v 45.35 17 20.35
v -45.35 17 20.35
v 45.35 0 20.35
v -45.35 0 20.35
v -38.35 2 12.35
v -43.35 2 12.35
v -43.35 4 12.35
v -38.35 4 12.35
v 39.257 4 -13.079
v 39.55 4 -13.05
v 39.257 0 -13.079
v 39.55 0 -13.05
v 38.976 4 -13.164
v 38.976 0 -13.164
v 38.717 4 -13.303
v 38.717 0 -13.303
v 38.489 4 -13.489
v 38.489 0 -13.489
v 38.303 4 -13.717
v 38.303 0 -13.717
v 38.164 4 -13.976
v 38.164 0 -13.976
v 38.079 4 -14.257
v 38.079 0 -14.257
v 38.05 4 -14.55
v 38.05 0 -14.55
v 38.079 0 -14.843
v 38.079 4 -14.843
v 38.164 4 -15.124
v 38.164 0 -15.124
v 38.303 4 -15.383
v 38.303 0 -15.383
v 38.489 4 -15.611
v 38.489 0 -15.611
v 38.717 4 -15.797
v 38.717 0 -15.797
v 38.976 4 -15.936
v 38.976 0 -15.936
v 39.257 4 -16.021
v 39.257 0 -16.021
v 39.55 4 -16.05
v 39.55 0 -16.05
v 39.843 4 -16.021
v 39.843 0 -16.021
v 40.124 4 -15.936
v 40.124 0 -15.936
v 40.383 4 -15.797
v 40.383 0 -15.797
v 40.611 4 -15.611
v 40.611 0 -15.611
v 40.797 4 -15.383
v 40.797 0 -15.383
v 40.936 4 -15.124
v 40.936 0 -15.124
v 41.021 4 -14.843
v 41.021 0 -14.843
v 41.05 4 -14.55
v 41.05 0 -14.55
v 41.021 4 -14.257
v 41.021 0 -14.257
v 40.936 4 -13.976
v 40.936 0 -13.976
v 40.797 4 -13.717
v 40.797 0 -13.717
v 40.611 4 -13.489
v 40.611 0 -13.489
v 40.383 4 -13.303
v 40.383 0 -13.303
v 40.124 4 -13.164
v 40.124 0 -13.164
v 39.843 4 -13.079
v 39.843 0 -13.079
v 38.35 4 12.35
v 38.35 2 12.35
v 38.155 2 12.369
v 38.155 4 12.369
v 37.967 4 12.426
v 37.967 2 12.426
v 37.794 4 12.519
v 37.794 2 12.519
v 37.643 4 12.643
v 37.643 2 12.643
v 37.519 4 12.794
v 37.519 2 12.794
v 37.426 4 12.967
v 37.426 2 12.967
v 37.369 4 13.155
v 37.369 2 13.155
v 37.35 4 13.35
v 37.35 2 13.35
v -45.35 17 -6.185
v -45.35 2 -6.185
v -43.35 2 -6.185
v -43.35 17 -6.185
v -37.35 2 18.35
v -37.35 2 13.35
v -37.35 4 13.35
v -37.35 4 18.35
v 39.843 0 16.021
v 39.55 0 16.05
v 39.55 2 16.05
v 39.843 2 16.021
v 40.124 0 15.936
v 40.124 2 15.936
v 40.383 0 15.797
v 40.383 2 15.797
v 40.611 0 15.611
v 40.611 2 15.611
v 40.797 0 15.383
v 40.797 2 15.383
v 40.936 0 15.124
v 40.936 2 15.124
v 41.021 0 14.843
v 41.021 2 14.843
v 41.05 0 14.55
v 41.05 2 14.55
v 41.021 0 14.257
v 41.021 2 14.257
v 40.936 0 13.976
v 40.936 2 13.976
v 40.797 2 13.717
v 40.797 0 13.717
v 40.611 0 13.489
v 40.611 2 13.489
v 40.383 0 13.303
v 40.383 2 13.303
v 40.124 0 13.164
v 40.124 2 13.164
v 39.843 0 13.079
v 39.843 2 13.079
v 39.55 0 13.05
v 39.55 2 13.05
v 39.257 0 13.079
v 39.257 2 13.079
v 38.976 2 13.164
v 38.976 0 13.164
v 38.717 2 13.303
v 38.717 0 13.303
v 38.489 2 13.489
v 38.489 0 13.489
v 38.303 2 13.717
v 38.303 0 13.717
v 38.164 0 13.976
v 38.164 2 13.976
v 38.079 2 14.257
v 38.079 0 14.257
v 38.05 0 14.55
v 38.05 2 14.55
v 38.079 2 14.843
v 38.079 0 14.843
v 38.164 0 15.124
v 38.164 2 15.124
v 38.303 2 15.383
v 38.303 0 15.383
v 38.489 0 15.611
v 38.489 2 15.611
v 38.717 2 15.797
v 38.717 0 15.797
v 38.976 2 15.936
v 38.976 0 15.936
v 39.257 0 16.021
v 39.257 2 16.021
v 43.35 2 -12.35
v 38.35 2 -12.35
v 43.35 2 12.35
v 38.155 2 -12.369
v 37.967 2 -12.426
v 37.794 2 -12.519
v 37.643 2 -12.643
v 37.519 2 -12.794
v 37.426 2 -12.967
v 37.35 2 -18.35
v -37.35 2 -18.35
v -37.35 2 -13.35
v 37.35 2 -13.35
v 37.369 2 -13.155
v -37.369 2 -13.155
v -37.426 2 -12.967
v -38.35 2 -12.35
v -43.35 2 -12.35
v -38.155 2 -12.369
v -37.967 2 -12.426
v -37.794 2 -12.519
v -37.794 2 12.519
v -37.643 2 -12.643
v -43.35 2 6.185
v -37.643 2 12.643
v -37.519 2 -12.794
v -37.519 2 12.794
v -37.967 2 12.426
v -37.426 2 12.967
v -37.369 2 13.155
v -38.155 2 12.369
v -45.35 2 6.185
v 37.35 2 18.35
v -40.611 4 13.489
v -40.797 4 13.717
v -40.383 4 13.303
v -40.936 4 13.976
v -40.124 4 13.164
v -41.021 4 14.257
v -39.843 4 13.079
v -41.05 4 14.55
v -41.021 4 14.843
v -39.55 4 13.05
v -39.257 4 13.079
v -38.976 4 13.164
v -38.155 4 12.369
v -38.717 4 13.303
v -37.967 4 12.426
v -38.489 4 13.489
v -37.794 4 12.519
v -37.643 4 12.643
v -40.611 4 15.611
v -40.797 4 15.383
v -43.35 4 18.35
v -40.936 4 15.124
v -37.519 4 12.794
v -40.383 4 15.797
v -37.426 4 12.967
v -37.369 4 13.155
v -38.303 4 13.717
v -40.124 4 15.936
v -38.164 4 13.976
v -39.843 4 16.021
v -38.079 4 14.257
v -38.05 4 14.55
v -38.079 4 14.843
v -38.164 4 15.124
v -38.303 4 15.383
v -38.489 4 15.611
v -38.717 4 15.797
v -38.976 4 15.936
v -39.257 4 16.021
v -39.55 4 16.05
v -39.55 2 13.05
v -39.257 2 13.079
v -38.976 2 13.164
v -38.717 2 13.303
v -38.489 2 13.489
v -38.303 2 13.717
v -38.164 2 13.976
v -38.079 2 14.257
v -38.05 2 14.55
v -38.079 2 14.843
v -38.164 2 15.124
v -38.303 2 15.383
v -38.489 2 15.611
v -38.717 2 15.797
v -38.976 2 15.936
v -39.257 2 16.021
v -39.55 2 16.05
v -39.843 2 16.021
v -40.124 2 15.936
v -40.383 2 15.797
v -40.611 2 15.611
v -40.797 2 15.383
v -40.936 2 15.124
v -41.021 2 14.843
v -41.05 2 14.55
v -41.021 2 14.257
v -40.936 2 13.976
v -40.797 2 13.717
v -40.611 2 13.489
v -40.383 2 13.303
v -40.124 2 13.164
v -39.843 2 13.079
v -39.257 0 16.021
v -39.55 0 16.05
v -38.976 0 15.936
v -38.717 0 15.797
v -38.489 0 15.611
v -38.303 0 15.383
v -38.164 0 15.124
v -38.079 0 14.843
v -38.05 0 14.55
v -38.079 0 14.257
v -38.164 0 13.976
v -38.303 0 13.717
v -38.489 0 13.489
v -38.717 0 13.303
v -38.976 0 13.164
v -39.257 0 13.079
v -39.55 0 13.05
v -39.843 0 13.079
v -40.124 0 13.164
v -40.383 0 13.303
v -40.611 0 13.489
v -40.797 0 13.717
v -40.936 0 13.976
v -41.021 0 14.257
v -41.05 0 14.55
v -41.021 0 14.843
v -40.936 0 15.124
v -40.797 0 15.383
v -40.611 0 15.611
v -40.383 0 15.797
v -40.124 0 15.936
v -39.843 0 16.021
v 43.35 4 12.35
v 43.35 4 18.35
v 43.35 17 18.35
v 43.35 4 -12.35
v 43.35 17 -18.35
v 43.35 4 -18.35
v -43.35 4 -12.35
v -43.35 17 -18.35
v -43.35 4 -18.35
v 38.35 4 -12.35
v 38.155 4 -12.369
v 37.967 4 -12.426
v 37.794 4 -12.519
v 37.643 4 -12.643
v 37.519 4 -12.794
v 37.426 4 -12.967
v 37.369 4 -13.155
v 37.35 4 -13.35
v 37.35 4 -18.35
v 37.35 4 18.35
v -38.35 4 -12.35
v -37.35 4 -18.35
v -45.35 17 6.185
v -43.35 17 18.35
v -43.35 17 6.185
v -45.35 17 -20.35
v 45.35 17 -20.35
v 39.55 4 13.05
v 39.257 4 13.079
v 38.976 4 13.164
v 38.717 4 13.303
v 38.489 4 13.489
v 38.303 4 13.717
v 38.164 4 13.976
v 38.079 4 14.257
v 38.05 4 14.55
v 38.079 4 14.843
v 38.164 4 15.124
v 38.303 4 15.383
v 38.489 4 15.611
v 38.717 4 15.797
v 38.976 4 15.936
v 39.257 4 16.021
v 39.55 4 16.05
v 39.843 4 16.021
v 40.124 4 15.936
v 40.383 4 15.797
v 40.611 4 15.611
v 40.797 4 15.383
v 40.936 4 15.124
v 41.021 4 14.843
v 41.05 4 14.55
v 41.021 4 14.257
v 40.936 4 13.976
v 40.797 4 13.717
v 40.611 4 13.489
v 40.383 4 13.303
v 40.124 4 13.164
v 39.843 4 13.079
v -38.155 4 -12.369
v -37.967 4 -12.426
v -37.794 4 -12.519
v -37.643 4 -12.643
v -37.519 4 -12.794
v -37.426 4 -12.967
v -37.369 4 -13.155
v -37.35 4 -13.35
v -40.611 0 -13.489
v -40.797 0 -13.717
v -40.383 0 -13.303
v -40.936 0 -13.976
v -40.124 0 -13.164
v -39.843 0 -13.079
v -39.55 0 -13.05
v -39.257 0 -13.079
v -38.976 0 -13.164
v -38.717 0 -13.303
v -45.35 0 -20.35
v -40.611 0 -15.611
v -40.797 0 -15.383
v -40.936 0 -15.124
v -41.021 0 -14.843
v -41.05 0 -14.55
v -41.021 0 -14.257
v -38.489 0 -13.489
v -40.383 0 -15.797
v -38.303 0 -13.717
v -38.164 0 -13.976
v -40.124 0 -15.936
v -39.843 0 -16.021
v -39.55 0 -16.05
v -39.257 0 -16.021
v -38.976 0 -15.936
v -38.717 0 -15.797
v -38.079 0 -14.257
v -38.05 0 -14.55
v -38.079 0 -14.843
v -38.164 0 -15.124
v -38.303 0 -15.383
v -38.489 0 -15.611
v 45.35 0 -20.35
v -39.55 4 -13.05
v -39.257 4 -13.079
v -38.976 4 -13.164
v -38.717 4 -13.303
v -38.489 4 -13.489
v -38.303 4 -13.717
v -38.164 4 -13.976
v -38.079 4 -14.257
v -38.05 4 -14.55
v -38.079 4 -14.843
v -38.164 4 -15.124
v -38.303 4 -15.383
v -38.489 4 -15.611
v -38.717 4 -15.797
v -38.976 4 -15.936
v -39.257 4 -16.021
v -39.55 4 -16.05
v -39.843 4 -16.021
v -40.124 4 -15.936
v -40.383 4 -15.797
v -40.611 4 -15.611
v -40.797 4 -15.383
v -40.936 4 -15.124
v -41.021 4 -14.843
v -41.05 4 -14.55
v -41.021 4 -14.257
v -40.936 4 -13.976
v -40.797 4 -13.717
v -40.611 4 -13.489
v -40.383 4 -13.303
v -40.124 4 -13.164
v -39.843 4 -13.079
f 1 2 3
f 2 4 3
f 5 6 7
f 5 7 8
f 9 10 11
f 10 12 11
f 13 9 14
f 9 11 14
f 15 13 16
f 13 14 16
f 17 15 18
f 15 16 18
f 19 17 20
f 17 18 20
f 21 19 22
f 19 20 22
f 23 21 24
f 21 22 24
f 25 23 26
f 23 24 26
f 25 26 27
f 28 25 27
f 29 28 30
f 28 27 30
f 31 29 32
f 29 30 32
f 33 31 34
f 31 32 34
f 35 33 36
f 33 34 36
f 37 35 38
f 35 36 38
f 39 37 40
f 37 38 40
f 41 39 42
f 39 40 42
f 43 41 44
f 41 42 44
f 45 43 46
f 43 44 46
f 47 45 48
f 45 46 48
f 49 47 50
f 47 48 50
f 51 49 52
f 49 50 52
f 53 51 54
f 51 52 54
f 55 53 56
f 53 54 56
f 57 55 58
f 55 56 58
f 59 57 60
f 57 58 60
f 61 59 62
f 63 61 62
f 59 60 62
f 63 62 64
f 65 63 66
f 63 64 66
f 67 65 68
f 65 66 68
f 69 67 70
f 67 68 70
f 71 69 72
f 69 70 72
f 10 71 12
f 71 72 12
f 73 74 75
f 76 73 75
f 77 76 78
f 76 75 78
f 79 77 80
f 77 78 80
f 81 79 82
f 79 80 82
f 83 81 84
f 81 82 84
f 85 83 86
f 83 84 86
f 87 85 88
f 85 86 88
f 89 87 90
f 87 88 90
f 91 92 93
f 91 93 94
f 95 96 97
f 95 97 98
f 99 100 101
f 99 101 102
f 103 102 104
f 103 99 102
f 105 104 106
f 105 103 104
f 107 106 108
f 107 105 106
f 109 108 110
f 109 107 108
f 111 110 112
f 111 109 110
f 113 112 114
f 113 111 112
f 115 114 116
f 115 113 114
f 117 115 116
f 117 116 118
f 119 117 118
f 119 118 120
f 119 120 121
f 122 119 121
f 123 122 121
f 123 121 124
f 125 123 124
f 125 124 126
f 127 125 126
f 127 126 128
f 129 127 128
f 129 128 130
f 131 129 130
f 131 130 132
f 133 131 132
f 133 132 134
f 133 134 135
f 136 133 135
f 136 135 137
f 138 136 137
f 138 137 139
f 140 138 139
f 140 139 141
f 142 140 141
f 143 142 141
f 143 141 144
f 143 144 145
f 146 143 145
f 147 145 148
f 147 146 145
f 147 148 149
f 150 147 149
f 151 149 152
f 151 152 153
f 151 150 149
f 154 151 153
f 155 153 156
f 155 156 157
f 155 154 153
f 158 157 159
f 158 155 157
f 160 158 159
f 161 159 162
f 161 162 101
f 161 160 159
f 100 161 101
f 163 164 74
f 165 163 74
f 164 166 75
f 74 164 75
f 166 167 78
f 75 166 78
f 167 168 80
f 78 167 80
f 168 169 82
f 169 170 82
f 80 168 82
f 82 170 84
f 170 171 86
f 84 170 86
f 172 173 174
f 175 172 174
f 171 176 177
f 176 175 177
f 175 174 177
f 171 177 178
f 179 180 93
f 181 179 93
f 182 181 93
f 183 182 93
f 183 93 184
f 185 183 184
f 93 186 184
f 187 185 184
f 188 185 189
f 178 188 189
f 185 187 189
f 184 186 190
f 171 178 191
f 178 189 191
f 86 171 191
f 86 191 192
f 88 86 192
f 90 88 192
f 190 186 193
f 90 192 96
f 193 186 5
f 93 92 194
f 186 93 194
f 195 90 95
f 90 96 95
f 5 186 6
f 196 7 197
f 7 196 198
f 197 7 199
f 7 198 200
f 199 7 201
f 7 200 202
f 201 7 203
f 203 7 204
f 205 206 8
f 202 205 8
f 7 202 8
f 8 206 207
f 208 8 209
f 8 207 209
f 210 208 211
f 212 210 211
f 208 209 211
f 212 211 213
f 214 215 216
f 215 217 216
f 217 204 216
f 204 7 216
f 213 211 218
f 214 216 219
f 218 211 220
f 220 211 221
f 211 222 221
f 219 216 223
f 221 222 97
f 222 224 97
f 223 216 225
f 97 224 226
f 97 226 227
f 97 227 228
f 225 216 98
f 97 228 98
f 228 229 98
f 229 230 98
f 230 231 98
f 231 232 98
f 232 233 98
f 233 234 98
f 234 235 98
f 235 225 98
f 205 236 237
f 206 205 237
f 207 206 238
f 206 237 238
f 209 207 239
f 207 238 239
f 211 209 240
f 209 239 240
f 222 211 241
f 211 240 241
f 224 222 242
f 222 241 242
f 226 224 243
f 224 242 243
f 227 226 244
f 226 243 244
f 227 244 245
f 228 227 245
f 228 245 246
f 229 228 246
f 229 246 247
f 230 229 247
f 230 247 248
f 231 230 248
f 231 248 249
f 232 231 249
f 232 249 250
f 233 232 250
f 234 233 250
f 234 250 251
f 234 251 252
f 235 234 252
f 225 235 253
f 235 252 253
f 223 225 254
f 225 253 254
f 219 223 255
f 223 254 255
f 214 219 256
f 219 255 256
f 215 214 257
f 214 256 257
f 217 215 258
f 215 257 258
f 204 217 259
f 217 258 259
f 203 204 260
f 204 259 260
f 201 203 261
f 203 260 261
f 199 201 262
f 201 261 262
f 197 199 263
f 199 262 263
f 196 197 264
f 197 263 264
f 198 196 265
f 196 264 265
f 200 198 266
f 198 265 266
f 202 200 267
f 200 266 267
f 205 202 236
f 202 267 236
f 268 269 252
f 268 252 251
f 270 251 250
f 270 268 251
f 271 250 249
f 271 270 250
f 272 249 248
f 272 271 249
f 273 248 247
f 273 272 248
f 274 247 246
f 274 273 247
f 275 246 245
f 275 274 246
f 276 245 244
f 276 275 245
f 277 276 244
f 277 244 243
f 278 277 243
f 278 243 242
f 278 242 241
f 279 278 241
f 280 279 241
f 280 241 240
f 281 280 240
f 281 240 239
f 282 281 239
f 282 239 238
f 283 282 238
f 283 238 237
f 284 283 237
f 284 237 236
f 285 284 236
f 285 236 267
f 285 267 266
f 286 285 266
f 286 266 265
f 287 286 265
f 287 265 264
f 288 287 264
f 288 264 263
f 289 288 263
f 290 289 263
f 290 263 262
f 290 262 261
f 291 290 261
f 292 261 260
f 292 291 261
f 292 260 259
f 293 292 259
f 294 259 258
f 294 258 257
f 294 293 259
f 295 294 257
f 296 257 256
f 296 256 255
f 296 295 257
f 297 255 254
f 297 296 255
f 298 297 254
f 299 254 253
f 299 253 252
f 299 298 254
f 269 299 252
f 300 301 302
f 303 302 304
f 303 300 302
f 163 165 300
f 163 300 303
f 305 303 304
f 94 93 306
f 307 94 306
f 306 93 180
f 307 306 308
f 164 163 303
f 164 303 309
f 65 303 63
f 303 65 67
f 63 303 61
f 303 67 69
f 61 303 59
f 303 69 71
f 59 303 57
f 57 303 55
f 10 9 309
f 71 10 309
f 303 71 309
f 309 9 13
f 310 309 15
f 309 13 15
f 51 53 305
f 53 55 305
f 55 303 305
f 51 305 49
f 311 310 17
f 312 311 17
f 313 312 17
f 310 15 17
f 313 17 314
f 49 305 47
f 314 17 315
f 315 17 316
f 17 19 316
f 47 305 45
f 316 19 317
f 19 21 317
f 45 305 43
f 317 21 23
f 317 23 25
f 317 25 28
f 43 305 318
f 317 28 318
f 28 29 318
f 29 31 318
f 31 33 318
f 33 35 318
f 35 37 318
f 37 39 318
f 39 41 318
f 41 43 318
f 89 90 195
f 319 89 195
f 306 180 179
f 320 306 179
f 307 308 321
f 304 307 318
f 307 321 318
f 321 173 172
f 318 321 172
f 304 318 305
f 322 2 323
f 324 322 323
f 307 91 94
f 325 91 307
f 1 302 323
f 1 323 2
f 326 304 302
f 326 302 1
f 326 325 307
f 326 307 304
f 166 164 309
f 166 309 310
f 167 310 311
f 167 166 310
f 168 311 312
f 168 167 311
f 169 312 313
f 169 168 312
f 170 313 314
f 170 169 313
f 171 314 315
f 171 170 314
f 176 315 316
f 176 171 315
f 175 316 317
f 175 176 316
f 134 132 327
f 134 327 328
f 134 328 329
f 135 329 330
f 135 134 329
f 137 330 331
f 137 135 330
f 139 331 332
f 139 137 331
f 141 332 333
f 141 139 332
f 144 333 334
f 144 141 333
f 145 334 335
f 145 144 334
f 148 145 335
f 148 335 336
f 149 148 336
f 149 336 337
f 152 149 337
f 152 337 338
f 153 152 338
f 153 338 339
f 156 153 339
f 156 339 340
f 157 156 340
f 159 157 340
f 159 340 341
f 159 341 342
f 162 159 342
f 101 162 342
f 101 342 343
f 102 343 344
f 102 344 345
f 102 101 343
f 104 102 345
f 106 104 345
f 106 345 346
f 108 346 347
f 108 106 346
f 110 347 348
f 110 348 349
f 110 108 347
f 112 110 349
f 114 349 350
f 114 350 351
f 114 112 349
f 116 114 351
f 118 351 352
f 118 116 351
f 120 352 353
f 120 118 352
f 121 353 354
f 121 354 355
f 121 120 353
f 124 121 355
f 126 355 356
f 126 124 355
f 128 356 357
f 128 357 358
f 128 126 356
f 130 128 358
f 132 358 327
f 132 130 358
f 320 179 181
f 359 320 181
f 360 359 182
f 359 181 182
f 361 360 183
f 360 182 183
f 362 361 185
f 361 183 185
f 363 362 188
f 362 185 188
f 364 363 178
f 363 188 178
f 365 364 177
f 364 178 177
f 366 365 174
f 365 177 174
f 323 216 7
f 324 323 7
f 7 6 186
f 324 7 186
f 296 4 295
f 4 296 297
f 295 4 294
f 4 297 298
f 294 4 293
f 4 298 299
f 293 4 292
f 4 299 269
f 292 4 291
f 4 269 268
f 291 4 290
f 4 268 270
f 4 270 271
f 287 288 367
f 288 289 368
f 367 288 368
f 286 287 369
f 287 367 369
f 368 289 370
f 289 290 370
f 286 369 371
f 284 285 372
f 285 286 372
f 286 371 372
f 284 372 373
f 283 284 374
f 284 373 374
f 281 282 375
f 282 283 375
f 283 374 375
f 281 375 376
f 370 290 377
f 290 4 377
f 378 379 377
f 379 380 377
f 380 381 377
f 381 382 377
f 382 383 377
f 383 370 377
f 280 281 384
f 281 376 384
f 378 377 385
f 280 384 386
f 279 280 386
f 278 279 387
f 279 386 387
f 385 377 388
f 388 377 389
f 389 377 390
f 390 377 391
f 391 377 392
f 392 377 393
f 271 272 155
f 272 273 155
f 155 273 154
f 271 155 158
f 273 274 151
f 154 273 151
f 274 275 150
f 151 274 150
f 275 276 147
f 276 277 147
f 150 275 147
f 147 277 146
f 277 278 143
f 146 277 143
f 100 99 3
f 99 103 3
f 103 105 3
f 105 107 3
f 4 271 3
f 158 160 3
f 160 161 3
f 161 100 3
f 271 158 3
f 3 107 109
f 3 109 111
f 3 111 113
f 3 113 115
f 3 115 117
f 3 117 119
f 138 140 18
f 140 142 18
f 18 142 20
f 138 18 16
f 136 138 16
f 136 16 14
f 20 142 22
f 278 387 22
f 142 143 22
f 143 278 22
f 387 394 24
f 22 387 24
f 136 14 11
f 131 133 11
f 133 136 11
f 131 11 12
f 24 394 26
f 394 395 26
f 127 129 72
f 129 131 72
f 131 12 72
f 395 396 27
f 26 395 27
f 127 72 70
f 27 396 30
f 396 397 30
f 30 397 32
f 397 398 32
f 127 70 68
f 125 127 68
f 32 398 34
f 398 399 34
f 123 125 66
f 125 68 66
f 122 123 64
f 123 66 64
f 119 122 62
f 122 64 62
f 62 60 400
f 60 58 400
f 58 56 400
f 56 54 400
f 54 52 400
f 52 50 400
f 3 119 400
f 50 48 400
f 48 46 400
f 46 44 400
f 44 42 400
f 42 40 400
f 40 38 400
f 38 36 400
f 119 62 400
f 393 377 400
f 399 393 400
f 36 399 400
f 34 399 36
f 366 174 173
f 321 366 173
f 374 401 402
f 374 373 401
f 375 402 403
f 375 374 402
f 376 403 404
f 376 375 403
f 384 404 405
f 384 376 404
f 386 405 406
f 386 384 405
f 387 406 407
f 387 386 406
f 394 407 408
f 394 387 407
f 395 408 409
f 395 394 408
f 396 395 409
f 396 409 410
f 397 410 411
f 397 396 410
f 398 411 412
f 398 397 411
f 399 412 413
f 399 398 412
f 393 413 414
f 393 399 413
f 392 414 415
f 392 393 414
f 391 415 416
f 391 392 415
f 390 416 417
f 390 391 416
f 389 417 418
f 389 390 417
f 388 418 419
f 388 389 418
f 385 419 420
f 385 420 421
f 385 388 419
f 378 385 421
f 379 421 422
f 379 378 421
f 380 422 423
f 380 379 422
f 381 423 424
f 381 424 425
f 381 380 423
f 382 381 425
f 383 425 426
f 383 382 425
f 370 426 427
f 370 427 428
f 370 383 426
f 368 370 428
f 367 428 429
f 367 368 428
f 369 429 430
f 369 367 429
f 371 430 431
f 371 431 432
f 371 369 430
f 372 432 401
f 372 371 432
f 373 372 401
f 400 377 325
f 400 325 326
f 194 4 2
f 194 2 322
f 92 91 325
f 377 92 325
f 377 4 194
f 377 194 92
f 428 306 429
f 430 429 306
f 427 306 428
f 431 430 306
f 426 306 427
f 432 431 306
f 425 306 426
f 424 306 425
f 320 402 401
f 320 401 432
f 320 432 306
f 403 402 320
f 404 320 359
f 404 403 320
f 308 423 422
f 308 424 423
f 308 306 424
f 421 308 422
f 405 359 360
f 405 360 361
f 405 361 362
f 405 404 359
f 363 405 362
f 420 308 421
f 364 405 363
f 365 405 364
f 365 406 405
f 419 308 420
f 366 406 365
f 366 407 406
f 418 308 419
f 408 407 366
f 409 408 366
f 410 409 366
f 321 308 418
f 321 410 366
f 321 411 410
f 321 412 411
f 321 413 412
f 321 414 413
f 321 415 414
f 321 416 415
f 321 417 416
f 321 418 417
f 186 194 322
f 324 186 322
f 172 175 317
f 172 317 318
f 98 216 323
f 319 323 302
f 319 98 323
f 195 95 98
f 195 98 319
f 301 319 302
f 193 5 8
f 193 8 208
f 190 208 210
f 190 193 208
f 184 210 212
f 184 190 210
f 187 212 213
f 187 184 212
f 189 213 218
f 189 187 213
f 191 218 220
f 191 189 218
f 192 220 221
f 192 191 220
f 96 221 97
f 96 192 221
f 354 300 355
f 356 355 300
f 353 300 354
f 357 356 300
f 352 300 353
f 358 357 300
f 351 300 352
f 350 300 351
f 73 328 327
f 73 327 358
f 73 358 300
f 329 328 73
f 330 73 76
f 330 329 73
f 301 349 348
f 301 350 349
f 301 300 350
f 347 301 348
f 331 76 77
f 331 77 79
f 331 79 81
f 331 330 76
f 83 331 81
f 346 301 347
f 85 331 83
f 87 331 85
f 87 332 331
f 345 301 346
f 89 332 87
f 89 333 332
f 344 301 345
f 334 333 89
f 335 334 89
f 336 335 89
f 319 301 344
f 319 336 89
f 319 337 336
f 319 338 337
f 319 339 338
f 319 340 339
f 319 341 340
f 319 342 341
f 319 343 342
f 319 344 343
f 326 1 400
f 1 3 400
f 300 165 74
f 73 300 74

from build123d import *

# Parameters (mm, degrees)
SKETCH1_W               = 90.7
SKETCH1_H               = 40.7
SKETCH1_R               = 1.5
BOSS_EXTRUDE3_DEPTH     = 2
SKETCH2_W               = 90.7
SKETCH2_H               = 40.7
SKETCH2_W_2             = 86.7
SKETCH2_H_2             = 36.7
BOSS_EXTRUDE4_DEPTH     = 15
CUT_EXTRUDE1_REACH      = 96.497
CUTOUT_W                = 12.369316876
CUTOUT_H                = 15
SKETCH3_R               = 1.5
BOSS_EXTRUDE5_DEPTH     = 2
MIRROR2_COPY_1_SKETCH_R = 1.5
MIRROR2_COPY_1_DEPTH    = 2


with BuildPart() as part:
    # Sketch1 → Boss-Extrude3 (new body)
    with BuildSketch(Plane(origin=(0, 0, 0), x_dir=(1, 0, 0), z_dir=(0, 1, 0))):
        Rectangle(SKETCH1_W, SKETCH1_H)
        with Locations(Location((-39.55, 14.55, 0), (0, 0, 270))):
            Circle(SKETCH1_R, mode=Mode.SUBTRACT)
        with Locations(Location((39.55, 14.55, 0), (0, 0, 270))):
            Circle(SKETCH1_R, mode=Mode.SUBTRACT)
        with Locations(Location((-39.55, -14.55, 0), (0, 0, 270))):
            Circle(SKETCH1_R, mode=Mode.SUBTRACT)
        with Locations(Location((39.55, -14.55, 0), (0, 0, 270))):
            Circle(SKETCH1_R, mode=Mode.SUBTRACT)
    extrude(amount=BOSS_EXTRUDE3_DEPTH)

    # Sketch2 → Boss-Extrude4 (add)
    with BuildSketch(Plane(origin=(0, 2, 0), x_dir=(1, 0, 0), z_dir=(0, 1, 0))):
        Rectangle(SKETCH2_W, SKETCH2_H)
        Rectangle(SKETCH2_W_2, SKETCH2_H_2, mode=Mode.SUBTRACT)
    extrude(amount=BOSS_EXTRUDE4_DEPTH)

    # Cutout → Cut-Extrude1 (cut, up to next)
    with BuildSketch(Plane.ZY.offset(45.35), mode=Mode.PRIVATE) as cut_extrude1_sk1:
        with Locations((0, 9.5)):
            Rectangle(CUTOUT_W, CUTOUT_H)
    cut_extrude1_tool1 = extrude(cut_extrude1_sk1.sketch, amount=-CUT_EXTRUDE1_REACH, mode=Mode.PRIVATE) & part.part
    add(cut_extrude1_tool1.solids().sort_by_distance((-45.35, 9.5, 0))[0], mode=Mode.SUBTRACT)

    # Sketch3 → Boss-Extrude5 (add)
    with BuildSketch(Plane(origin=(0, 2, 0), x_dir=(1, 0, 0), z_dir=(0, 1, 0))):
        with BuildLine():
            Line((-43.35, 12.35), (-38.35, 12.35))
            ThreePointArc((-38.35, 12.35), (-37.642893219, 12.642893219), (-37.35, 13.35))
            Line((-37.35, 13.35), (-37.35, 18.35))
            Line((-37.35, 18.35), (-43.35, 18.35))
            Line((-43.35, 18.35), (-43.35, 12.35))
        make_face()
        with Locations(Location((-39.55, 14.55, 0), (0, 0, 270))):
            Circle(SKETCH3_R, mode=Mode.SUBTRACT)
    boss_extrude5 = extrude(amount=BOSS_EXTRUDE5_DEPTH)

    # Mirror1: Boss-Extrude5 across plane
    add(boss_extrude5.mirror(Plane(origin=(0, 0, 0), x_dir=(0, 0, 1), z_dir=(1, 0, 0))))

    # Mirror2: Boss-Extrude5 across plane
    add(boss_extrude5.mirror(Plane.XY))

    # Mirror2 copy 1 sketch → Mirror2 copy 1 (add)
    with BuildSketch(Plane(origin=(0, 2, 0), x_dir=(-1, 0, 0), z_dir=(0, 1, 0))):
        with BuildLine():
            Line((-43.35, 12.35), (-38.35, 12.35))
            ThreePointArc((-38.35, 12.35), (-37.642893219, 12.642893219), (-37.35, 13.35))
            Line((-37.35, 13.35), (-37.35, 18.35))
            Line((-37.35, 18.35), (-43.35, 18.35))
            Line((-43.35, 18.35), (-43.35, 12.35))
        make_face()
        with Locations(Location((-39.55, 14.55, 0), (0, 0, 270))):
            Circle(MIRROR2_COPY_1_SKETCH_R, mode=Mode.SUBTRACT)
    extrude(amount=MIRROR2_COPY_1_DEPTH)


solid = part.part
